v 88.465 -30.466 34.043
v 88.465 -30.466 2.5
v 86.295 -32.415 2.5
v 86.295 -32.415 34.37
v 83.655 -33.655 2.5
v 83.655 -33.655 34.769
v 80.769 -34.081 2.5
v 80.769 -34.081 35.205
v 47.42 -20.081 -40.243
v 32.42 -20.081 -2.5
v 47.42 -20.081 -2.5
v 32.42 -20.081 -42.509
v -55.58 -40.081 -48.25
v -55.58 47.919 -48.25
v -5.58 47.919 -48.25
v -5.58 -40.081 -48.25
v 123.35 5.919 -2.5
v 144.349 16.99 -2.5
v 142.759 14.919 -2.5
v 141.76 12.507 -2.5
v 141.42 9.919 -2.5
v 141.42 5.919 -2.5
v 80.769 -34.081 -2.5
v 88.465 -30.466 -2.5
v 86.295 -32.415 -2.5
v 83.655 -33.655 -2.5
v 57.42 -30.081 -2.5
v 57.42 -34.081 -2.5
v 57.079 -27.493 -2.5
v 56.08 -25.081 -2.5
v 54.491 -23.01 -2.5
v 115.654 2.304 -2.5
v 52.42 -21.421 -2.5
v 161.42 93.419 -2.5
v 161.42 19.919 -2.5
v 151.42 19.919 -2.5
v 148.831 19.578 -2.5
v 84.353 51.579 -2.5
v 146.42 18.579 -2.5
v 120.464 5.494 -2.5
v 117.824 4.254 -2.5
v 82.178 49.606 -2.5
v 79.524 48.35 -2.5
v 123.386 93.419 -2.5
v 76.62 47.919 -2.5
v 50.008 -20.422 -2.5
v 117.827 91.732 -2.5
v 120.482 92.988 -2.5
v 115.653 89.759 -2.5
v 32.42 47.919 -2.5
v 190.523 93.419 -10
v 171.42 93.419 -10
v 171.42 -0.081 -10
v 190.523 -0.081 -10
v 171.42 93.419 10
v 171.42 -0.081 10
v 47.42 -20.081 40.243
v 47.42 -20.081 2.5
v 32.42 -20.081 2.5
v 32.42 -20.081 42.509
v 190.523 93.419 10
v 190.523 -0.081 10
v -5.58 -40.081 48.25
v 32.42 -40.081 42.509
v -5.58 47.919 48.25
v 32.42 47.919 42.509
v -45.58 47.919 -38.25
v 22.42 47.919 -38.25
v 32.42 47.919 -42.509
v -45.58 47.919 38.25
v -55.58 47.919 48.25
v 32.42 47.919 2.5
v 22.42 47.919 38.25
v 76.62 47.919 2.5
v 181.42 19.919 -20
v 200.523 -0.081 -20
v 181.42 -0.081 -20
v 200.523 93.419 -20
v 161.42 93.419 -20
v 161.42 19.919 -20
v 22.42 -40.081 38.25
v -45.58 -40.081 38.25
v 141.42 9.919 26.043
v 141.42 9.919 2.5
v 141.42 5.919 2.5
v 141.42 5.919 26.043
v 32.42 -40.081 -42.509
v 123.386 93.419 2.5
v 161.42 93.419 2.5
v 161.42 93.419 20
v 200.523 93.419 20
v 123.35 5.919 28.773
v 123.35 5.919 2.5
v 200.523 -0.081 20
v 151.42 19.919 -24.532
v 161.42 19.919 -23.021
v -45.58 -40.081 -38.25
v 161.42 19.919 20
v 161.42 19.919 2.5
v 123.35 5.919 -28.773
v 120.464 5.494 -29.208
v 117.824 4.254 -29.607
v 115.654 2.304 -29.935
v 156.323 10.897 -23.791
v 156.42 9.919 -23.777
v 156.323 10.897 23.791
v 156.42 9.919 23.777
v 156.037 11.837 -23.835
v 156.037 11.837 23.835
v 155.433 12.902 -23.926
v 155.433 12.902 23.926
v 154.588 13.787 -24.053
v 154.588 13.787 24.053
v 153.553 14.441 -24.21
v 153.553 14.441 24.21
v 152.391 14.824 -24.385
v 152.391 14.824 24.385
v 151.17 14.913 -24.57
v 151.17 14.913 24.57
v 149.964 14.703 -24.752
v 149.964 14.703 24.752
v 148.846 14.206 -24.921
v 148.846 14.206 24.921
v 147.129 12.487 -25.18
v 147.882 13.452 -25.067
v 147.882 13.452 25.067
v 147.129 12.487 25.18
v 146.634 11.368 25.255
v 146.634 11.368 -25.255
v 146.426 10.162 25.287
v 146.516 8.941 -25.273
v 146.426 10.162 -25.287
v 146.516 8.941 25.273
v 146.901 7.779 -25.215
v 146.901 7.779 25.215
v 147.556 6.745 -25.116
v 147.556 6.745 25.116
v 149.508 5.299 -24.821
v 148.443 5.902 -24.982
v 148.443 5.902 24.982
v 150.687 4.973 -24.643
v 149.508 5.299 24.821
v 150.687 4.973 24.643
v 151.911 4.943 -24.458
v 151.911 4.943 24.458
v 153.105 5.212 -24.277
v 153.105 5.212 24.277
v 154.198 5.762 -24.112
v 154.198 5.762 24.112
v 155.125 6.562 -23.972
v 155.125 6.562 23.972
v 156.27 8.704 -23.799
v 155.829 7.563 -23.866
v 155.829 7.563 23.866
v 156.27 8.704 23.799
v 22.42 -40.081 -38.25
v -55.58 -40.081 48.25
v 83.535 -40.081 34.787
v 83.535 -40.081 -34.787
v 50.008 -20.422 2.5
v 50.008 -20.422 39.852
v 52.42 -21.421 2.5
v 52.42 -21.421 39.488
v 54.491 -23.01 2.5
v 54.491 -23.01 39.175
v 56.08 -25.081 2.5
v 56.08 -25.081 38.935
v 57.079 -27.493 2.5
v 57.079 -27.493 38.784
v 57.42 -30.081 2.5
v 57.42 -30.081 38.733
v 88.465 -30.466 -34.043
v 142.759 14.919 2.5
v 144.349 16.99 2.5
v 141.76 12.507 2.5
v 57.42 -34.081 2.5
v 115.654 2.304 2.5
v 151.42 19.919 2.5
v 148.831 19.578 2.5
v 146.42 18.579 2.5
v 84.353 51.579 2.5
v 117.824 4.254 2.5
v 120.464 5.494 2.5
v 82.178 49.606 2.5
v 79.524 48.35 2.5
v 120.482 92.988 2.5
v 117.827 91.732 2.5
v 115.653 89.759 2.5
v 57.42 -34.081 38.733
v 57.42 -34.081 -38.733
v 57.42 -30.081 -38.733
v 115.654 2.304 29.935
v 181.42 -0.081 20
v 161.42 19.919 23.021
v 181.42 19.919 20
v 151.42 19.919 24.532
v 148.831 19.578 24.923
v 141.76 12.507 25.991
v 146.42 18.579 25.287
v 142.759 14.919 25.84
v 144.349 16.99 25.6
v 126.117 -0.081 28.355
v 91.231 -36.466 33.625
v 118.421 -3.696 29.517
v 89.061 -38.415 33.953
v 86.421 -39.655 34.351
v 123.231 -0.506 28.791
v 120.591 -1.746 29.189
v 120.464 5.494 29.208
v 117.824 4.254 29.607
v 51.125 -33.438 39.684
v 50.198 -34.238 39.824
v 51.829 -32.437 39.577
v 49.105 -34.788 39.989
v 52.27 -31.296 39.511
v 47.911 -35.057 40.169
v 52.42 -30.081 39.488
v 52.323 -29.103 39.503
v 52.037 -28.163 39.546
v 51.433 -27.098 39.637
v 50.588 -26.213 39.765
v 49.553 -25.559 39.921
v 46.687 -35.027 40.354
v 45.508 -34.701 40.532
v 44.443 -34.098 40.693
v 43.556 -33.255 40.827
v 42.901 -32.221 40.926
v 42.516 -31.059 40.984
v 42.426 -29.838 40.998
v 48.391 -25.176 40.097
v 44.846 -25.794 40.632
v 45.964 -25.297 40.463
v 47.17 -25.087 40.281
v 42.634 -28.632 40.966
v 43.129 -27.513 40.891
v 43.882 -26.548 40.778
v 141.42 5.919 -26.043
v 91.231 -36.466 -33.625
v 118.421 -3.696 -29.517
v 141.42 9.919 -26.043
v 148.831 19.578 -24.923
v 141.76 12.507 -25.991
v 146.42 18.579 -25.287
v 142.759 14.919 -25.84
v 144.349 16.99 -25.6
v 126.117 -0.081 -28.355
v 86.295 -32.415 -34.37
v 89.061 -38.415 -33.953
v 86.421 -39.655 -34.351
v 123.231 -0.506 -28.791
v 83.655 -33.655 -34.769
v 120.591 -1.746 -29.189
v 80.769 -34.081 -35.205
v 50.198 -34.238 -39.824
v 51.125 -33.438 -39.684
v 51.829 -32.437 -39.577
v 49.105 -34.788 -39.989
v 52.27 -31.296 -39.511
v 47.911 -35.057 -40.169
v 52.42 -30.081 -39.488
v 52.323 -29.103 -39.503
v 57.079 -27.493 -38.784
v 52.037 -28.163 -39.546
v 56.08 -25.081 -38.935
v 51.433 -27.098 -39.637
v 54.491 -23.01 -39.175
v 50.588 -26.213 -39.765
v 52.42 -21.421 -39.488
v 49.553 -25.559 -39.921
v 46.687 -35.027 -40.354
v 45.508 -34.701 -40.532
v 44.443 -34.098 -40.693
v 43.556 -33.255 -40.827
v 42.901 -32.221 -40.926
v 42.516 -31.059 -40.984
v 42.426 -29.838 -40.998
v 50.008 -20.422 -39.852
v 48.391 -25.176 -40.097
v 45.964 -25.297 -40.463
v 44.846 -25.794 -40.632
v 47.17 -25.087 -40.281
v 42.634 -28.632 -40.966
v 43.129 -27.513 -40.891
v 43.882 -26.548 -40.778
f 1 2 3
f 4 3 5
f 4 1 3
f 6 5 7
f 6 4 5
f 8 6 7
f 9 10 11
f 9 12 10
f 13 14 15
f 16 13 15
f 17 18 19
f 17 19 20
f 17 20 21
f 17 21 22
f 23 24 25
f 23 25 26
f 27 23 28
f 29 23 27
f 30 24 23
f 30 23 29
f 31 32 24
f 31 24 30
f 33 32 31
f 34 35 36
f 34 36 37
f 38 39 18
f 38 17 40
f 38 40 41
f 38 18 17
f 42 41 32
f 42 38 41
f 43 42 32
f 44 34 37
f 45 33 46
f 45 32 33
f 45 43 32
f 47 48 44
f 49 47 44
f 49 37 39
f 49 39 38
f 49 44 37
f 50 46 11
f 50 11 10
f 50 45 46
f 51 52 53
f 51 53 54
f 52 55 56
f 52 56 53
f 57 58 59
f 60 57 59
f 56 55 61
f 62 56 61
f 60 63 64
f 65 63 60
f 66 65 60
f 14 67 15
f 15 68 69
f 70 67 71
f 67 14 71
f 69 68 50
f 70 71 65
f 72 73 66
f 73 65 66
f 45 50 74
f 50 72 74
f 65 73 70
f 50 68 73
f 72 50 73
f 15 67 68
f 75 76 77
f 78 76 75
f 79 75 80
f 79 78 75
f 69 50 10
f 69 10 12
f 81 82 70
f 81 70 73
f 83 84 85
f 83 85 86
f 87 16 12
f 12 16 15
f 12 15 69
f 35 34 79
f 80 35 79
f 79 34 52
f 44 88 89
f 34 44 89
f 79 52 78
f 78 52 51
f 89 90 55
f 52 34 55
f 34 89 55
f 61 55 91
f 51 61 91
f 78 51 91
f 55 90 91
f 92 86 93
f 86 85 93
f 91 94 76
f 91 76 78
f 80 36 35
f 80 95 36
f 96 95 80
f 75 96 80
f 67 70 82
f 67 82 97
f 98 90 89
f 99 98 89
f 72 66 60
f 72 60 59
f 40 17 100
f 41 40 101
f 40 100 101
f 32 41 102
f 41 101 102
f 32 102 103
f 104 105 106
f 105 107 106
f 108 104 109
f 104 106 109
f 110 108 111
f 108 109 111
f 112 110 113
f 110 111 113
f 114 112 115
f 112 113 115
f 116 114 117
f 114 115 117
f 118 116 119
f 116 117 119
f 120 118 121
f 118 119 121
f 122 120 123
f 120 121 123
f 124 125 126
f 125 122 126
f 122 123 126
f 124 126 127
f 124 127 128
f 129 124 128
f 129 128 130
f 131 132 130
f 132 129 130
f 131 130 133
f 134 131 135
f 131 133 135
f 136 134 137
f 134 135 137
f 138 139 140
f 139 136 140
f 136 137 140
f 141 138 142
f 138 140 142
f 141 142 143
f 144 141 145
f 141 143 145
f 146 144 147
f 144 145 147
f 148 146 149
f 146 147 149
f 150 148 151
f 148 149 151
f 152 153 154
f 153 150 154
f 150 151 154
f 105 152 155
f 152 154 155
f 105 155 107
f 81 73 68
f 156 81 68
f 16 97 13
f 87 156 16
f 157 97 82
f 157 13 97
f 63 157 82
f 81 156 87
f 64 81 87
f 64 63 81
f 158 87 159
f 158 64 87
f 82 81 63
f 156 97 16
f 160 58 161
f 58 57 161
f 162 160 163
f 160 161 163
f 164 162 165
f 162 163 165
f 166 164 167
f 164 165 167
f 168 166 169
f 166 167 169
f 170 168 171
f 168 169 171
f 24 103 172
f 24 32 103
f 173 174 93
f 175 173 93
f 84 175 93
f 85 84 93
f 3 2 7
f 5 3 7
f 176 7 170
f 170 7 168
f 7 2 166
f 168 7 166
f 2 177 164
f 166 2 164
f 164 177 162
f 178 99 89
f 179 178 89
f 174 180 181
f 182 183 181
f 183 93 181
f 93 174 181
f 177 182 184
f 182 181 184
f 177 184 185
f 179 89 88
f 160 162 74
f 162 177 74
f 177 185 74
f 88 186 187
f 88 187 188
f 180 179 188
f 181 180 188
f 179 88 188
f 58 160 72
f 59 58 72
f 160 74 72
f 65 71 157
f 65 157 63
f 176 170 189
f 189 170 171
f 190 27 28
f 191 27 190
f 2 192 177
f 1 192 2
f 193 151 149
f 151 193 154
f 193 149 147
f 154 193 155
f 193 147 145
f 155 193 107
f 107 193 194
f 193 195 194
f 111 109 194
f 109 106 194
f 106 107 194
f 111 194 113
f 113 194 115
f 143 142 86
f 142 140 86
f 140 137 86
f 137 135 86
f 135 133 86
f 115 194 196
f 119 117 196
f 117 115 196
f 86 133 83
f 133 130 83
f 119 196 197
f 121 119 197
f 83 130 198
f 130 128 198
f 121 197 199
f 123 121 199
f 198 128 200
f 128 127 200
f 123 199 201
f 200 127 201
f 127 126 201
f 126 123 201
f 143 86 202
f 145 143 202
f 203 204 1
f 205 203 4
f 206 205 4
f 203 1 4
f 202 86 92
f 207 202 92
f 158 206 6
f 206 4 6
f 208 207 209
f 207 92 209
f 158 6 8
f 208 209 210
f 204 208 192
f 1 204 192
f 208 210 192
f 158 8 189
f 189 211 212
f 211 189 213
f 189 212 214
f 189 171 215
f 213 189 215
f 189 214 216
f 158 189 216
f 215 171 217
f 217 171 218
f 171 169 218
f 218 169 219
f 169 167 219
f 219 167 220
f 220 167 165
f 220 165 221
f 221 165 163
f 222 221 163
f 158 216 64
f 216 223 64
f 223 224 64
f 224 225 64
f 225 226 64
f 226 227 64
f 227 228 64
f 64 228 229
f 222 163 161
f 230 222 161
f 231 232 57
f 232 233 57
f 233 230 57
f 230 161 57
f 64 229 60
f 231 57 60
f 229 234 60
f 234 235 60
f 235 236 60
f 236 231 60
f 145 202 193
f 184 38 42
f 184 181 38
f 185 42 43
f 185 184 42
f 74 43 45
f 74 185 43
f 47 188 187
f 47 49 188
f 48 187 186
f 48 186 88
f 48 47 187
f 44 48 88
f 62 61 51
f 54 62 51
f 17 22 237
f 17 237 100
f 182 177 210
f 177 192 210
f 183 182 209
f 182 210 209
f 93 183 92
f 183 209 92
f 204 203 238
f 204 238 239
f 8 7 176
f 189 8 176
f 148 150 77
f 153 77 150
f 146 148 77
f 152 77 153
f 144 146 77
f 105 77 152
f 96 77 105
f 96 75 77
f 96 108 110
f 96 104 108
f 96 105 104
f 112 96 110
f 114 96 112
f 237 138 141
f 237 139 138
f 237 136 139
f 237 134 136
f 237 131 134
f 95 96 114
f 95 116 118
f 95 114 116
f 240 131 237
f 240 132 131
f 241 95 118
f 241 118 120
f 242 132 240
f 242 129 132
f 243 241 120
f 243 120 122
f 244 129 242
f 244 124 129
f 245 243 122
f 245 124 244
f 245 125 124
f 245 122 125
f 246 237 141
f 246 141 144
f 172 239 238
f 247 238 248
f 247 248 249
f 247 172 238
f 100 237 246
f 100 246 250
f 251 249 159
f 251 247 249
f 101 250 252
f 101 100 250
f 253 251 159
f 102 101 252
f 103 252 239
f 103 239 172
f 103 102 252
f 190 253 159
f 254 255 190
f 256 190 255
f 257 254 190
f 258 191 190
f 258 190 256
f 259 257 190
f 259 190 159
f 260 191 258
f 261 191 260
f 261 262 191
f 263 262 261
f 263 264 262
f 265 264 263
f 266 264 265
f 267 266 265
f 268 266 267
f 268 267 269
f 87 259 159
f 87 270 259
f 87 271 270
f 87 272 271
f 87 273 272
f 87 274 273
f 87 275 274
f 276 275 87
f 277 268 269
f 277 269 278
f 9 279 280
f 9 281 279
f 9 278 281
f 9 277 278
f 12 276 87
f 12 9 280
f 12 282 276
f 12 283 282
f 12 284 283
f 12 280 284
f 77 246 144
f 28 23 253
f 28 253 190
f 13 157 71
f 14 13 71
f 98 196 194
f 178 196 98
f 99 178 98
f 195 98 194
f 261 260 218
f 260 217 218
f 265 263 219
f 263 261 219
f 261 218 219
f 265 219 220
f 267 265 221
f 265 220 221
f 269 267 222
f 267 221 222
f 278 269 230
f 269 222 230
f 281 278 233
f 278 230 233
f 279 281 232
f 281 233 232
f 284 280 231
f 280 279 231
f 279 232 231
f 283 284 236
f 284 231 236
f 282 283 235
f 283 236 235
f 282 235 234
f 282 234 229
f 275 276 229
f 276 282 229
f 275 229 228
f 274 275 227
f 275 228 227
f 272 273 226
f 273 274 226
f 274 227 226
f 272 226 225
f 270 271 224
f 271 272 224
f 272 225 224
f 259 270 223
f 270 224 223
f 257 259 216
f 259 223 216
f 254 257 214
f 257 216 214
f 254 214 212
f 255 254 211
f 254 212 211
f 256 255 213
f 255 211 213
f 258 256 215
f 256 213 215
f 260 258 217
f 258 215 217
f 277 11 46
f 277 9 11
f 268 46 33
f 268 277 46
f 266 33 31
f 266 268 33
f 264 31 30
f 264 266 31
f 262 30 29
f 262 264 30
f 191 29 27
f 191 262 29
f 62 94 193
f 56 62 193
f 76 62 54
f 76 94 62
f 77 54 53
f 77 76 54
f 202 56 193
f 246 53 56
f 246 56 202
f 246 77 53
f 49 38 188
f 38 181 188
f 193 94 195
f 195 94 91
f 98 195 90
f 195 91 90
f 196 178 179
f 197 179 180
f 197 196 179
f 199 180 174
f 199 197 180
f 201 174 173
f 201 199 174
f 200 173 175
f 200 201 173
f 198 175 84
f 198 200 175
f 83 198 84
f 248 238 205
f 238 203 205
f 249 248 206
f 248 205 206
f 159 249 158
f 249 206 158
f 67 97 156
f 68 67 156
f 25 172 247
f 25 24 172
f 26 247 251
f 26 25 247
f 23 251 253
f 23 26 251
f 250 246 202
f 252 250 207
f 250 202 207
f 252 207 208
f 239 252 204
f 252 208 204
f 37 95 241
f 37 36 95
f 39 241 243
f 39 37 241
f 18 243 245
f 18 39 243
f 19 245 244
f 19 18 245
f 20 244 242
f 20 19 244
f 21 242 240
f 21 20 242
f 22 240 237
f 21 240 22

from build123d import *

# Parameters (mm, degrees)
SKETCH1_W                = 256.103174946
SKETCH1_H                = 133.5
BOSS_EXTRUDE1_DEPTH      = 48.25
SKETCH2_W                = 88
SKETCH2_H                = 45.5
CUT_EXTRUDE1_DEPTH       = 96.5
SKETCH4_W                = 39.103174946
SKETCH4_H                = 40
CUT_EXTRUDE2_DEPTH       = 96.5
SKETCH5_W                = 68
SKETCH5_H                = 76.5
CUT_EXTRUDE3_DEPTH       = 88
CUT_EXTRUDE4_DEPTH       = 133.5
CUT_EXTRUDE5_DEPTH       = 88
CUT_EXTRUDE6_DEPTH       = 88
SKETCH9_W                = 19.103174946
SKETCH9_H                = 20
CUT_EXTRUDE7_DEPTH       = 93.5
CUT_EXTRUDE8_DEPTH       = 73.5
CUT_EXTRUDE9_DEPTH       = 45.5
SKETCH17_W               = 46.042780748
SKETCH17_H               = 40
CUT_EXTRUDE12_DEPTH      = 40
CUT_EXTRUDE13_DEPTH      = 28
SKETCH23_W               = 40
SKETCH23_H               = 40
CUT_EXTRUDE20_DEPTH      = 8
SKETCH24_W               = 40
SKETCH24_H               = 40
CUT_EXTRUDE21_DEPTH      = 8
CUT_EXTRUDE22_DEPTH      = 14
CUT_EXTRUDE23_DEPTH      = 14
CUT_EXTRUDE24_DEPTH      = 30
CUT_EXTRUDE24_DEPTH_BACK = 30
SKETCH29_R               = 5
FILLET1_R                = 10
CUT_EXTRUDE25_DEPTH      = 26
CUT_EXTRUDE26_DEPTH      = 26
CUT_EXTRUDE28_DEPTH      = 40
CUT_EXTRUDE29_DEPTH      = 40
CUT_EXTRUDE30_DEPTH      = 40
CUT_EXTRUDE30_DEPTH_BACK = 40
FILLET2_R                = 10
FILLET3_R                = 10
FILLET4_R                = 10
CUT_EXTRUDE31_DEPTH      = 40
CUT_EXTRUDE31_DEPTH_BACK = 40
CUT_EXTRUDE32_DEPTH      = 2.5
CUT_EXTRUDE32_DEPTH_BACK = 2.5
CUT_EXTRUDE33_DEPTH      = 43
CUT_EXTRUDE33_DEPTH_BACK = 43
SKETCH53_R               = 5
BOSS_EXTRUDE4_DEPTH      = 2.5
BOSS_EXTRUDE4_DEPTH_BACK = 2.5
FILLET7_R                = 10


with BuildPart() as part:
    # Sketch1 → Boss-Extrude1 (new, symmetric)
    with BuildSketch(Plane.XY):
        with Locations((72.471204682, 26.669157508)):
            Rectangle(SKETCH1_W, SKETCH1_H)
    extrude(amount=BOSS_EXTRUDE1_DEPTH, both=True)

    # Sketch2 → Cut-Extrude1 (cut)
    with BuildSketch(Plane.XY.offset(48.25)):
        with Locations((-11.580382791, 70.669157508)):
            Rectangle(SKETCH2_W, SKETCH2_H)
    extrude(amount=-CUT_EXTRUDE1_DEPTH, mode=Mode.SUBTRACT)

    # Sketch4 → Cut-Extrude2 (cut)
    with BuildSketch(Plane.XY.offset(48.25)):
        with Locations((180.971204682, -20.080842492)):
            Rectangle(SKETCH4_W, SKETCH4_H)
    extrude(amount=-CUT_EXTRUDE2_DEPTH, mode=Mode.SUBTRACT)

    # Sketch5 → Cut-Extrude3 (cut)
    with BuildSketch(Plane(origin=(0, 47.919157508, 0), x_dir=(1, 0, 0), z_dir=(0, 1, 0))):
        with Locations((-11.580382791, 0)):
            Rectangle(SKETCH5_W, SKETCH5_H)
    extrude(amount=-CUT_EXTRUDE3_DEPTH, mode=Mode.SUBTRACT)

    # Sketch6 → Cut-Extrude4 (cut)
    with BuildSketch(Plane(origin=(0, 93.419157508, 0), x_dir=(1, 0, 0), z_dir=(0, 1, 0))):
        Polygon((200.522792155, 48.25), (200.522792155, 20), (181.419617209, 20), (32.419617209, 42.509358289), (32.419617209, 48.25), align=None)
        Polygon((200.522792155, -48.25), (200.522792155, -20), (181.419617209, -20), (32.419617209, -42.509358289), (32.419617209, -48.25), align=None)
    extrude(amount=-CUT_EXTRUDE4_DEPTH, mode=Mode.SUBTRACT)

    # Sketch7 → Cut-Extrude5 (cut)
    with BuildSketch(Plane(origin=(0, 47.919157508, 0), x_dir=(1, 0, 0), z_dir=(0, 1, 0))):
        Polygon((-5.580382791, 48.25), (32.419617209, 42.509358289), (32.419617209, 48.25), align=None)
    extrude(amount=-CUT_EXTRUDE5_DEPTH, mode=Mode.SUBTRACT)

    # Sketch8 → Cut-Extrude6 (cut)
    with BuildSketch(Plane(origin=(0, 47.919157508, 0), x_dir=(1, 0, 0), z_dir=(0, 1, 0))):
        Polygon((-5.580382791, -48.25), (32.419617209, -42.509358289), (32.419617209, -48.25), align=None)
    extrude(amount=-CUT_EXTRUDE6_DEPTH, mode=Mode.SUBTRACT)

    # Sketch9 → Cut-Extrude7 (cut)
    with BuildSketch(Plane(origin=(0, 93.419157508, 0), x_dir=(1, 0, 0), z_dir=(0, 1, 0))):
        with Locations((180.971204682, 0)):
            Rectangle(SKETCH9_W, SKETCH9_H)
    extrude(amount=-CUT_EXTRUDE7_DEPTH, mode=Mode.SUBTRACT)

    # Sketch10 → Cut-Extrude8 (cut)
    with BuildSketch(Plane(origin=(0, 93.419157508, 0), x_dir=(1, 0, 0), z_dir=(0, 1, 0))):
        Polygon((161.419617209, 20), (181.419617209, 20), (161.419617209, 23.021390374), align=None)
        Polygon((181.419617209, -20), (161.419617209, -20), (161.419617209, -23.021390374), align=None)
    extrude(amount=-CUT_EXTRUDE8_DEPTH, mode=Mode.SUBTRACT)

    # Sketch14 → Cut-Extrude9 (cut)
    with BuildSketch(Plane(origin=(0, 93.419157508, 0), x_dir=(1, 0, 0), z_dir=(0, 1, 0))):
        Polygon((161.419617209, 20), (161.419617209, 2.5), (32.419617209, 2.5), (32.419617209, 42.509358289), (161.419617209, 23.021390374), align=None)
        Polygon((161.419617209, -20), (161.419617209, -2.5), (32.419617209, -2.5), (32.419617209, -42.509358289), (161.419617209, -23.021390374), align=None)
    extrude(amount=-CUT_EXTRUDE9_DEPTH, mode=Mode.SUBTRACT)

    # Sketch17 → Cut-Extrude12 (cut)
    with BuildSketch(Plane(origin=(161.419617209, 0, 0), x_dir=(0, 0, -1), z_dir=(1, 0, 0))):
        with Locations((0, -20.080842492)):
            Rectangle(SKETCH17_W, SKETCH17_H)
    extrude(amount=-CUT_EXTRUDE12_DEPTH, mode=Mode.SUBTRACT)

    # Sketch19 → Cut-Extrude13 (cut)
    with BuildSketch(Plane(origin=(0, 47.919157508, 0), x_dir=(1, 0, 0), z_dir=(0, 1, 0))):
        Polygon((32.419617209, -2.5), (32.419617209, -42.509358289), (161.419617209, -23.021390374), (161.419617209, -20), (161.419617209, -2.5), align=None)
        Polygon((32.419617209, 2.5), (32.419617209, 42.509358289), (161.419617209, 23.021390374), (161.419617209, 2.5), align=None)
    extrude(amount=-CUT_EXTRUDE13_DEPTH, mode=Mode.SUBTRACT)

    # Sketch23 → Cut-Extrude20 (cut)
    with BuildSketch(Plane(origin=(0, 0, 23.021390374), x_dir=(-1, 0, 0), z_dir=(0, 0, -1))):
        with Locations((-141.419617209, -20.080842492)):
            Rectangle(SKETCH23_W, SKETCH23_H)
    extrude(amount=-CUT_EXTRUDE20_DEPTH, mode=Mode.SUBTRACT)

    # Sketch24 → Cut-Extrude21 (cut)
    with BuildSketch(Plane.XY.offset(-23.021390374)):
        with Locations((141.419617209, -20.080842492)):
            Rectangle(SKETCH24_W, SKETCH24_H)
    extrude(amount=-CUT_EXTRUDE21_DEPTH, mode=Mode.SUBTRACT)

    # Sketch26 → Cut-Extrude22 (cut)
    with BuildSketch(Plane(origin=(0, 19.919157508, 0), x_dir=(1, 0, 0), z_dir=(0, 1, 0))):
        Polygon((141.419617209, -2.5), (141.419617209, -26.042780749), (32.419617209, -42.509358289), (32.419617209, -2.5), align=None)
    extrude(amount=-CUT_EXTRUDE22_DEPTH, mode=Mode.SUBTRACT)

    # Sketch27 → Cut-Extrude23 (cut)
    with BuildSketch(Plane(origin=(0, 19.919157508, 0), x_dir=(1, 0, 0), z_dir=(0, 1, 0))):
        Polygon((141.419617209, 2.5), (32.419617209, 2.5), (32.419617209, 42.509358289), (141.419617209, 26.042780749), align=None)
    extrude(amount=-CUT_EXTRUDE23_DEPTH, mode=Mode.SUBTRACT)

    # Sketch29 → Cut-Extrude24 (cut, two sides: drawn at the far end of the back side and taken through both)
    with BuildSketch(Plane.XY.offset(-CUT_EXTRUDE24_DEPTH_BACK)):
        with Locations((151.419617209, 9.919157508)):
            Circle(SKETCH29_R)
    extrude(amount=CUT_EXTRUDE24_DEPTH + CUT_EXTRUDE24_DEPTH_BACK, mode=Mode.SUBTRACT)

    # Fillet1
    fillet1_edges = [part.edges().sort_by_distance(p)[0] for p in [
        (141.419617209, 19.919157508, 14.271390374),
    ]]
    fillet(fillet1_edges, radius=FILLET1_R)

    # Sketch31 → Cut-Extrude25 (cut)
    with BuildSketch(Plane(origin=(0, 5.919157508, 0), x_dir=(1, 0, 0), z_dir=(0, 1, 0))):
        Polygon((32.419617209, -2.5), (57.419617209, -2.5), (57.419617209, -38.732620321), (32.419617209, -42.509358289), align=None)
    extrude(amount=-CUT_EXTRUDE25_DEPTH, mode=Mode.SUBTRACT)

    # Sketch32 → Cut-Extrude26 (cut)
    with BuildSketch(Plane(origin=(0, 5.919157508, 0), x_dir=(1, 0, 0), z_dir=(0, 1, 0))):
        Polygon((32.419617209, 2.5), (57.419617209, 2.5), (57.419617209, 38.732620321), (32.419617209, 42.509358289), align=None)
    extrude(amount=-CUT_EXTRUDE26_DEPTH, mode=Mode.SUBTRACT)

    # Sketch40 → Cut-Extrude28 (cut)
    with BuildSketch(Plane(origin=(0, 5.919157508, 0), x_dir=(1, 0, 0), z_dir=(0, 1, 0))):
        Polygon((57.419617209, 38.732620321), (81.352447073, 35.117099232), (81.352447073, 2.5), (57.419617209, 2.5), align=None)
    extrude(amount=-CUT_EXTRUDE28_DEPTH, mode=Mode.SUBTRACT)

    # Sketch41 → Cut-Extrude29 (cut)
    with BuildSketch(Plane(origin=(0, 5.919157508, 0), x_dir=(1, 0, 0), z_dir=(0, 1, 0))):
        Polygon((57.419617209, -2.5), (57.419617209, -38.732620321), (81.352447073, -35.117099232), (81.352447073, -2.5), align=None)
    extrude(amount=-CUT_EXTRUDE29_DEPTH, mode=Mode.SUBTRACT)

    # Sketch43 → Cut-Extrude30 (cut, two sides: drawn at the far end of the back side and taken through both)
    with BuildSketch(Plane.XY.offset(-CUT_EXTRUDE30_DEPTH_BACK)):
        Polygon((88.23219723, -40.080842492), (121.419617209, -0.080842492), (121.419617209, -40.080842492), align=None)
    extrude(amount=CUT_EXTRUDE30_DEPTH + CUT_EXTRUDE30_DEPTH_BACK, mode=Mode.SUBTRACT)

    # Fillet2
    fillet2_edges = [part.edges().sort_by_distance(p)[0] for p in [
        (88.23219723, -40.080842492, 0),
        (121.419617209, -0.080842492, 0),
    ]]
    fillet(fillet2_edges, radius=FILLET2_R)

    # Fillet3
    fillet3_edges = [part.edges().sort_by_distance(p)[0] for p in [
        (57.419617209, -20.080842492, 20.61631016),
    ]]
    fillet(fillet3_edges, radius=FILLET3_R)

    # Fillet4
    fillet4_edges = [part.edges().sort_by_distance(p)[0] for p in [
        (57.419617209, -20.080842492, -20.61631016),
    ]]
    fillet(fillet4_edges, radius=FILLET4_R)

    # Sketch44 → Cut-Extrude31 (cut, two sides: drawn at the far end of the back side and taken through both)
    with BuildSketch(Plane.XY.offset(-CUT_EXTRUDE31_DEPTH_BACK)):
        Polygon((81.352447073, 5.919157508), (118.653161204, 5.919157508), (85.465741224, -34.080842492), (81.352447073, -34.080842492), align=None)
    extrude(amount=CUT_EXTRUDE31_DEPTH + CUT_EXTRUDE31_DEPTH_BACK, mode=Mode.SUBTRACT)

    # Sketch49 → Cut-Extrude32 (cut, two sides: drawn at the far end of the back side and taken through both)
    with BuildSketch(Plane.XY.offset(-CUT_EXTRUDE32_DEPTH_BACK)):
        Polygon((118.653161204, 5.919157508), (118.653161204, 93.419157508), (32.419617209, 93.419157508), (32.419617209, 47.919157508), (81.352447073, 47.919157508), (81.352447073, 5.919157508), align=None)
    extrude(amount=CUT_EXTRUDE32_DEPTH + CUT_EXTRUDE32_DEPTH_BACK, mode=Mode.SUBTRACT)

    # Sketch53 → Cut-Extrude33 (cut, two sides: drawn at the far end of the back side and taken through both)
    with BuildSketch(Plane.XY.offset(-CUT_EXTRUDE33_DEPTH_BACK)):
        with Locations((47.419617209, -30.080842492)):
            Circle(SKETCH53_R)
    extrude(amount=CUT_EXTRUDE33_DEPTH + CUT_EXTRUDE33_DEPTH_BACK, mode=Mode.SUBTRACT)

    # Sketch55 → Boss-Extrude4 (add, two sides: drawn at the far end of the back side and taken through both)
    with BuildSketch(Plane.XY.offset(-BOSS_EXTRUDE4_DEPTH_BACK)):
        Polygon((81.352447073, 47.919157508), (118.653161204, 93.419157508), (118.653161204, 5.919157508), (85.465741224, -34.080842492), (80.854981216, -34.080842492), align=None)
    extrude(amount=BOSS_EXTRUDE4_DEPTH + BOSS_EXTRUDE4_DEPTH_BACK)

    # Fillet7
    fillet7_edges = [part.edges().sort_by_distance(p)[0] for p in [
        (85.465741224, -34.080842492, -18.497852932),
        (118.653161204, 5.919157508, -15.99104915),
        (141.419617209, 19.919157508, -14.271390374),
        (81.352447073, 47.919157508, 0),
        (118.653161204, 93.419157508, 0),
        (85.465741224, -34.080842492, 18.497852932),
        (118.653161204, 5.919157508, 15.99104915),
    ]]
    fillet(fillet7_edges, radius=FILLET7_R)


solid = part.part
